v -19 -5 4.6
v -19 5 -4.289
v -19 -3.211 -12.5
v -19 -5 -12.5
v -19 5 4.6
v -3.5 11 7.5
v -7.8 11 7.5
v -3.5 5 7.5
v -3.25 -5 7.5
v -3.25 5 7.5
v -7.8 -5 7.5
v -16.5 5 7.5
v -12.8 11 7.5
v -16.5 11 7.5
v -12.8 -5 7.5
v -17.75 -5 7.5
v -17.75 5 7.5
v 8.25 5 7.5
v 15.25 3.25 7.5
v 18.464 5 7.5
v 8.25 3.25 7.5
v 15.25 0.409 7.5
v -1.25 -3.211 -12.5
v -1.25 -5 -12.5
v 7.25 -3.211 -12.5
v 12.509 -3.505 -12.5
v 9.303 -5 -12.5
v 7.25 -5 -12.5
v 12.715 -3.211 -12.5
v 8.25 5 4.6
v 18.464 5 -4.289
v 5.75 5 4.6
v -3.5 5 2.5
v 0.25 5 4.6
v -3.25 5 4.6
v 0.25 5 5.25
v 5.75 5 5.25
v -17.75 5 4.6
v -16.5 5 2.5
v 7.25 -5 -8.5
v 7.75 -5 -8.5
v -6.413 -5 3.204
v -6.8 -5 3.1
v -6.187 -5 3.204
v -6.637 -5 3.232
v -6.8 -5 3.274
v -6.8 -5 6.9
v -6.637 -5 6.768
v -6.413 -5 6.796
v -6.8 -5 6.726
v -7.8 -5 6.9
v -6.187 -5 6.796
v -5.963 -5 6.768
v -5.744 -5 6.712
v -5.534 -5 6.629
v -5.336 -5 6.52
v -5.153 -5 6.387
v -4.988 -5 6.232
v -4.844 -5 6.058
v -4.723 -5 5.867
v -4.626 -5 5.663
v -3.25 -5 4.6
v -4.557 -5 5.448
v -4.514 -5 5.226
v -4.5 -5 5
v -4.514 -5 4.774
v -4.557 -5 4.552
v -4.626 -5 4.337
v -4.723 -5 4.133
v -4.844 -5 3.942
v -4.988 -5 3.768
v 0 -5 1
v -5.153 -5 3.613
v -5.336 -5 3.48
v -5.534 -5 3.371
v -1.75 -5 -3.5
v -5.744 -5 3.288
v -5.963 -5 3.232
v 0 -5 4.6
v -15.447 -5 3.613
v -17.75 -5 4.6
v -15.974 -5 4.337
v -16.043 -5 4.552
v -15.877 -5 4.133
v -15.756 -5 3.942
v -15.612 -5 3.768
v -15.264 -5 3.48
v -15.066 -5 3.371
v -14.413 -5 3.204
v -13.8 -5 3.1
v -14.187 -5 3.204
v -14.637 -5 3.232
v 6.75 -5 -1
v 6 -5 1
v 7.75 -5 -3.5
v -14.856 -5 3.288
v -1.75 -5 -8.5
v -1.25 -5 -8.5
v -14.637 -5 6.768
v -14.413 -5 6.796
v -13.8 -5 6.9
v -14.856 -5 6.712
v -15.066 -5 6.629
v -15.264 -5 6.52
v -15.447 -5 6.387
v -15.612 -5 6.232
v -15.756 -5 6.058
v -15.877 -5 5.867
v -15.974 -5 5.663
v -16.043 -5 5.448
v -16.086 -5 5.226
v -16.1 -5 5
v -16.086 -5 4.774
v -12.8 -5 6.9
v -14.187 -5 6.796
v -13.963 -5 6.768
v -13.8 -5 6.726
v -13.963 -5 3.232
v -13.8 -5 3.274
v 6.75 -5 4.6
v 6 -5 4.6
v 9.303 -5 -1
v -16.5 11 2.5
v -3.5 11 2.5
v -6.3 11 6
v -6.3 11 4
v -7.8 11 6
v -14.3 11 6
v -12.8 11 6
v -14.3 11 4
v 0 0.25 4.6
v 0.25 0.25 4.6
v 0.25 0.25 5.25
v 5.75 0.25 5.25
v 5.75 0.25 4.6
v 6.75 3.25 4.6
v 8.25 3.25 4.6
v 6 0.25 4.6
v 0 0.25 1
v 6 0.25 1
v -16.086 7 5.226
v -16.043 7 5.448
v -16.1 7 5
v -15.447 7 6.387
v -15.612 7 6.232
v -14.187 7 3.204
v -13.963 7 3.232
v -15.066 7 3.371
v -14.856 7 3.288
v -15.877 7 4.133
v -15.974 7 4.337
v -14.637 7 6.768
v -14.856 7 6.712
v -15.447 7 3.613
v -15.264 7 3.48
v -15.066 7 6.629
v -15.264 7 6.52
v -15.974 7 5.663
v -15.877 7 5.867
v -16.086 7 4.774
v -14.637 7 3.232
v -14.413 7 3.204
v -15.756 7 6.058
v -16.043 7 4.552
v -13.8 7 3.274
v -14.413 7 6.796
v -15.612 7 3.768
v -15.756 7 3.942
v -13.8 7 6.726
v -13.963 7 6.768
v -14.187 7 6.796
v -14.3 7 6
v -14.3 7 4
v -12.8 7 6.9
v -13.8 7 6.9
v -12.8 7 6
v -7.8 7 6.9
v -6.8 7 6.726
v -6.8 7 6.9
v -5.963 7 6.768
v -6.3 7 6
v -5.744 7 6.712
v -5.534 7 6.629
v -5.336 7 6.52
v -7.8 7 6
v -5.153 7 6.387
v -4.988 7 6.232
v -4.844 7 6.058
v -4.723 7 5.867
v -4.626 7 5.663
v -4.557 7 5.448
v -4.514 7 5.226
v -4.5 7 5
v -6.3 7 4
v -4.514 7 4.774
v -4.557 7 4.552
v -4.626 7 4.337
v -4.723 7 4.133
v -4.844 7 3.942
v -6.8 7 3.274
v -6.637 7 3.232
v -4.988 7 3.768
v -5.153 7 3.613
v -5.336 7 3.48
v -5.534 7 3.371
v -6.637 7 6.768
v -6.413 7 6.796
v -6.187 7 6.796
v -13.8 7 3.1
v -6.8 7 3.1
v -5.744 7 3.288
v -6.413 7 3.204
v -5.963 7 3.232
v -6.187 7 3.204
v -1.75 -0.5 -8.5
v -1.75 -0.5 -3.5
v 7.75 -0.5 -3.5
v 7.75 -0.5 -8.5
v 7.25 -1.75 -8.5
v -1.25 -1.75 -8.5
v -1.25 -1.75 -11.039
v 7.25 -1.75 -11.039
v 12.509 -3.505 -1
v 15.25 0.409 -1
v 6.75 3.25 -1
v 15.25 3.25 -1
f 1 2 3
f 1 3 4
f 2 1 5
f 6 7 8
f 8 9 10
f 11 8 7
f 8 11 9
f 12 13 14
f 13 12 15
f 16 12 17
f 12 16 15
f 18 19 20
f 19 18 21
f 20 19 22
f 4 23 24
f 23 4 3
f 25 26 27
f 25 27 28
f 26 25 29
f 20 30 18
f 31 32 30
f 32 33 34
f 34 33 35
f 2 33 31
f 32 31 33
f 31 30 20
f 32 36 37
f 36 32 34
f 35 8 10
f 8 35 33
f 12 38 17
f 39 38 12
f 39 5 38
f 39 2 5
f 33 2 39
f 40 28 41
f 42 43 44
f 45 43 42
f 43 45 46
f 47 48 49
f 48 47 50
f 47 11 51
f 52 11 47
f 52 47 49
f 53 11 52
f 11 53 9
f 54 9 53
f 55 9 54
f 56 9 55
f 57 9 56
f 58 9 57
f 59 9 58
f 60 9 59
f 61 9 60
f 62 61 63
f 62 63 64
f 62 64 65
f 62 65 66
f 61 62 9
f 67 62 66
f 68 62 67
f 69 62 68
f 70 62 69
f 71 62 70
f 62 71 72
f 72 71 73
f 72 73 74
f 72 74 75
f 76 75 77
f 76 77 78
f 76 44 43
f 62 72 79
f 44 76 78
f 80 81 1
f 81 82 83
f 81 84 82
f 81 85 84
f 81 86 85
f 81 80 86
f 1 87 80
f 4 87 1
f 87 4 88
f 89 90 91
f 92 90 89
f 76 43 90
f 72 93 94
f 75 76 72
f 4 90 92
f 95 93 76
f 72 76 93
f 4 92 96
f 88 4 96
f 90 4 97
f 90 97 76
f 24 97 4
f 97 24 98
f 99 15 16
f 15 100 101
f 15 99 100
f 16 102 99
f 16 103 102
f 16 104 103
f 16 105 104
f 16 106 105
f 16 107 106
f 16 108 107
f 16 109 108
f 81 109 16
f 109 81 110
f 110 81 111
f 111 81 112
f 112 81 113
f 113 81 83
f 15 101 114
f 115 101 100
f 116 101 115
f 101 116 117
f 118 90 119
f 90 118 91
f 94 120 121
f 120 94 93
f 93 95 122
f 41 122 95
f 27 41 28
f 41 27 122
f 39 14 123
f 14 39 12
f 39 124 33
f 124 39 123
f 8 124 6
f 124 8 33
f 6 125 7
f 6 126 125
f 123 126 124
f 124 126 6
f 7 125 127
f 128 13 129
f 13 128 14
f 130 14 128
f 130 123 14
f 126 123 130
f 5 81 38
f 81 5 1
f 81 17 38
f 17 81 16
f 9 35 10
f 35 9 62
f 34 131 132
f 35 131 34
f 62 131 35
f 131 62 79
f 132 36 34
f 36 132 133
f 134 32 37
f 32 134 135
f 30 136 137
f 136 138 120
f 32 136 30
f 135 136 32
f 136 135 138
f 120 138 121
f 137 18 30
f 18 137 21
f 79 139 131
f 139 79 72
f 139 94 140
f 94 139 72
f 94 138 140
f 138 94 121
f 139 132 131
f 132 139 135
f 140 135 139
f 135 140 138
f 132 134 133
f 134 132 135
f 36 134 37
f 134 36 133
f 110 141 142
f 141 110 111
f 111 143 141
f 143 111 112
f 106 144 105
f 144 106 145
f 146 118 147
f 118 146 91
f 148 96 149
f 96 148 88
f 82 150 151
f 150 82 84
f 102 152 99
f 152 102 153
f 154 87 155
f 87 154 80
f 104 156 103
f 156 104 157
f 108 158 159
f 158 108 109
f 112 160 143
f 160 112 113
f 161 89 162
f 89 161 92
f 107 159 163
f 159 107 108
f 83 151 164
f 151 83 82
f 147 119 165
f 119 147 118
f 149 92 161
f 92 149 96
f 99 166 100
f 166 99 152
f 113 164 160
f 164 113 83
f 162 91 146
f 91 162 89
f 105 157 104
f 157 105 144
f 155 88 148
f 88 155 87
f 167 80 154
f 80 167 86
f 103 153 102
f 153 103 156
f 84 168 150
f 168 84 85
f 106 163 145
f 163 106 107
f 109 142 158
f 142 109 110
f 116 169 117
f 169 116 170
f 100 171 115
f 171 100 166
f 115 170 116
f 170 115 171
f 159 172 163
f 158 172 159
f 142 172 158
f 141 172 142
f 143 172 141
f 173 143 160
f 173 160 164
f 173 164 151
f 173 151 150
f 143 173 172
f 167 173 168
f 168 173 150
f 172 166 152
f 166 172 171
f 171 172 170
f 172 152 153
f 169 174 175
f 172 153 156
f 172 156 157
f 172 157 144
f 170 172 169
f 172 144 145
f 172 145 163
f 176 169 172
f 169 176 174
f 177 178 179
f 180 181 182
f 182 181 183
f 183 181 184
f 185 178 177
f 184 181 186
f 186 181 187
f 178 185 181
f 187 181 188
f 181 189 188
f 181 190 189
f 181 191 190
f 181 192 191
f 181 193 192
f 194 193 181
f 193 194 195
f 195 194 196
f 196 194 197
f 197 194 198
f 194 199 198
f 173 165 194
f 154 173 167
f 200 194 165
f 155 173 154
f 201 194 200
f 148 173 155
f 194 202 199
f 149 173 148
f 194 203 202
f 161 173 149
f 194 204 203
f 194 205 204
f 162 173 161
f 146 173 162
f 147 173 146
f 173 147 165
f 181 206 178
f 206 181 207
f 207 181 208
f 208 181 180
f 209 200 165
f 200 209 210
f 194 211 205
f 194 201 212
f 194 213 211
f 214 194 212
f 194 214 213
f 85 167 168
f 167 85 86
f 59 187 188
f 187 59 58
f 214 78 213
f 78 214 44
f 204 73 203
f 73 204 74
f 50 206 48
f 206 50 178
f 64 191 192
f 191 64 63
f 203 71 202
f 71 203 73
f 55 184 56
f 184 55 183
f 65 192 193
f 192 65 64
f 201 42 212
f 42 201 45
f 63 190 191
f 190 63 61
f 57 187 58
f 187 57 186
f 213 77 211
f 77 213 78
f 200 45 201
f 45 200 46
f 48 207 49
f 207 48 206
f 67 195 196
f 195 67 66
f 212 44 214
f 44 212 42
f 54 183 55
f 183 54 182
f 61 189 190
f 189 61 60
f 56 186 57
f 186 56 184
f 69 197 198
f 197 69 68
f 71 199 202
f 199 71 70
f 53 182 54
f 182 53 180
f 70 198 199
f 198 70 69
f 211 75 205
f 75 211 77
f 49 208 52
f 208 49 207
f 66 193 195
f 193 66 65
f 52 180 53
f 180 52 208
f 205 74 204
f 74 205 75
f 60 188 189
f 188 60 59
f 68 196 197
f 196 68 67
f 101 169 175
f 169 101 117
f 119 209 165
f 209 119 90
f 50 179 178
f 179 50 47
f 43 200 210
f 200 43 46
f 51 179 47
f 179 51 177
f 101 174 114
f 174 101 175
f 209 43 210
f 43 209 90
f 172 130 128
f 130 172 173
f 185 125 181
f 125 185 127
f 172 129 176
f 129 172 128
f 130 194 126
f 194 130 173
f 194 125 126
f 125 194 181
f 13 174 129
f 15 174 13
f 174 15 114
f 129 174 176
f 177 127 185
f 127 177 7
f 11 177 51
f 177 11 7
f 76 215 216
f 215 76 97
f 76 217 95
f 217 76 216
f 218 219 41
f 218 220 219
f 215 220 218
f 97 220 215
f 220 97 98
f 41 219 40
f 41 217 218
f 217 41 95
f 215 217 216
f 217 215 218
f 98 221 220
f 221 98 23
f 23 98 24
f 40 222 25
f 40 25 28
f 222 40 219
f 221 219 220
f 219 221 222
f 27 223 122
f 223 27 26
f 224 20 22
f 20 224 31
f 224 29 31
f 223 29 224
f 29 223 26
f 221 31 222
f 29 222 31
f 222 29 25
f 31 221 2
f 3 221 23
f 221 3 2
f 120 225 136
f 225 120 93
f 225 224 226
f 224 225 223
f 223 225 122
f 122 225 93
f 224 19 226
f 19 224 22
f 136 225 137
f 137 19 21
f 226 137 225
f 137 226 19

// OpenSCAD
// file: connector_holder.scad
$fn = 50;


module connector_holder () {
difference() {
    
  union() {  
  translate([0,0,-2.5])
    cube([38, 10, 20], center=true);

  translate([10, 3, 5]) 
    cube([13, 16, 5], center=true);
  }

translate([-74, -30, 0])
  rotate([0,0,65])
    cube([100, 100, 100], center=true);

translate([-69, -10, 0])
  rotate([0,0,35])
    cube([100, 100, 100], center=true);
  
translate([0, 50, -30])
  rotate([45,0,0])
    cube([100, 100, 100], center=true);

translate([-11, -1, 4])
  cube([8.5, 8.5, 10], center= true);

translate([17, 0, 6.1])
  topcuts();

translate([-3,-2.5,4])
  button();

translate([10.3,0, 5])
    usbc();

translate([-3, -3, -6]) 
  switcher();
    
}
}



connector_holder();




//translate([17, 0, 6.5])
//  topcuts();

//translate([9.5,0, 40])
//    button();

module topcuts() {

  translate([2, 0, 0])
    cube([2.5, 30, 3], center = true);
    
  translate([-15.5, 0, 0])
    cube([3.5, 30, 3, ], center = true);

  translate([-24, 0, 0])
    cube([2.5, 30, 3, ], center = true);
}


module button() {
    
    cube([6.0, 5.5, 6], center=true);
    
    translate([0,3,4])
    cube([5.8, 15.5, 5.5], center=true);
    
}

module usbc() {
    
    rotate([90,0,0])
    union() {
    translate([4.0, 0, 0])
      cylinder(r=1.8, h=14, center=true);

    translate([-4.0, 0, 0])
      cylinder(r=1.8, h=14, center=true);

    cube([7, 3.8, 14], center=true);
    }   
    
    translate([0,10,0])
      cube([8,10,2], center=true);
     
    translate([0,0,3])
      cube([5,40,5], center=true);
    
}


module switcher() {
    
    cube([9.5, 5, 5], center=true);
    
    translate([0, -0.5, -4.4]) 
      cube([8.5, 3.5, 4.5], center=true);
    
}



    
// main file
use <connector_holder.scad>;

module connector_holder_mirror() {
    scale([-1,1,1]) {
        connector_holder();
    }
}

connector_holder_mirror();
